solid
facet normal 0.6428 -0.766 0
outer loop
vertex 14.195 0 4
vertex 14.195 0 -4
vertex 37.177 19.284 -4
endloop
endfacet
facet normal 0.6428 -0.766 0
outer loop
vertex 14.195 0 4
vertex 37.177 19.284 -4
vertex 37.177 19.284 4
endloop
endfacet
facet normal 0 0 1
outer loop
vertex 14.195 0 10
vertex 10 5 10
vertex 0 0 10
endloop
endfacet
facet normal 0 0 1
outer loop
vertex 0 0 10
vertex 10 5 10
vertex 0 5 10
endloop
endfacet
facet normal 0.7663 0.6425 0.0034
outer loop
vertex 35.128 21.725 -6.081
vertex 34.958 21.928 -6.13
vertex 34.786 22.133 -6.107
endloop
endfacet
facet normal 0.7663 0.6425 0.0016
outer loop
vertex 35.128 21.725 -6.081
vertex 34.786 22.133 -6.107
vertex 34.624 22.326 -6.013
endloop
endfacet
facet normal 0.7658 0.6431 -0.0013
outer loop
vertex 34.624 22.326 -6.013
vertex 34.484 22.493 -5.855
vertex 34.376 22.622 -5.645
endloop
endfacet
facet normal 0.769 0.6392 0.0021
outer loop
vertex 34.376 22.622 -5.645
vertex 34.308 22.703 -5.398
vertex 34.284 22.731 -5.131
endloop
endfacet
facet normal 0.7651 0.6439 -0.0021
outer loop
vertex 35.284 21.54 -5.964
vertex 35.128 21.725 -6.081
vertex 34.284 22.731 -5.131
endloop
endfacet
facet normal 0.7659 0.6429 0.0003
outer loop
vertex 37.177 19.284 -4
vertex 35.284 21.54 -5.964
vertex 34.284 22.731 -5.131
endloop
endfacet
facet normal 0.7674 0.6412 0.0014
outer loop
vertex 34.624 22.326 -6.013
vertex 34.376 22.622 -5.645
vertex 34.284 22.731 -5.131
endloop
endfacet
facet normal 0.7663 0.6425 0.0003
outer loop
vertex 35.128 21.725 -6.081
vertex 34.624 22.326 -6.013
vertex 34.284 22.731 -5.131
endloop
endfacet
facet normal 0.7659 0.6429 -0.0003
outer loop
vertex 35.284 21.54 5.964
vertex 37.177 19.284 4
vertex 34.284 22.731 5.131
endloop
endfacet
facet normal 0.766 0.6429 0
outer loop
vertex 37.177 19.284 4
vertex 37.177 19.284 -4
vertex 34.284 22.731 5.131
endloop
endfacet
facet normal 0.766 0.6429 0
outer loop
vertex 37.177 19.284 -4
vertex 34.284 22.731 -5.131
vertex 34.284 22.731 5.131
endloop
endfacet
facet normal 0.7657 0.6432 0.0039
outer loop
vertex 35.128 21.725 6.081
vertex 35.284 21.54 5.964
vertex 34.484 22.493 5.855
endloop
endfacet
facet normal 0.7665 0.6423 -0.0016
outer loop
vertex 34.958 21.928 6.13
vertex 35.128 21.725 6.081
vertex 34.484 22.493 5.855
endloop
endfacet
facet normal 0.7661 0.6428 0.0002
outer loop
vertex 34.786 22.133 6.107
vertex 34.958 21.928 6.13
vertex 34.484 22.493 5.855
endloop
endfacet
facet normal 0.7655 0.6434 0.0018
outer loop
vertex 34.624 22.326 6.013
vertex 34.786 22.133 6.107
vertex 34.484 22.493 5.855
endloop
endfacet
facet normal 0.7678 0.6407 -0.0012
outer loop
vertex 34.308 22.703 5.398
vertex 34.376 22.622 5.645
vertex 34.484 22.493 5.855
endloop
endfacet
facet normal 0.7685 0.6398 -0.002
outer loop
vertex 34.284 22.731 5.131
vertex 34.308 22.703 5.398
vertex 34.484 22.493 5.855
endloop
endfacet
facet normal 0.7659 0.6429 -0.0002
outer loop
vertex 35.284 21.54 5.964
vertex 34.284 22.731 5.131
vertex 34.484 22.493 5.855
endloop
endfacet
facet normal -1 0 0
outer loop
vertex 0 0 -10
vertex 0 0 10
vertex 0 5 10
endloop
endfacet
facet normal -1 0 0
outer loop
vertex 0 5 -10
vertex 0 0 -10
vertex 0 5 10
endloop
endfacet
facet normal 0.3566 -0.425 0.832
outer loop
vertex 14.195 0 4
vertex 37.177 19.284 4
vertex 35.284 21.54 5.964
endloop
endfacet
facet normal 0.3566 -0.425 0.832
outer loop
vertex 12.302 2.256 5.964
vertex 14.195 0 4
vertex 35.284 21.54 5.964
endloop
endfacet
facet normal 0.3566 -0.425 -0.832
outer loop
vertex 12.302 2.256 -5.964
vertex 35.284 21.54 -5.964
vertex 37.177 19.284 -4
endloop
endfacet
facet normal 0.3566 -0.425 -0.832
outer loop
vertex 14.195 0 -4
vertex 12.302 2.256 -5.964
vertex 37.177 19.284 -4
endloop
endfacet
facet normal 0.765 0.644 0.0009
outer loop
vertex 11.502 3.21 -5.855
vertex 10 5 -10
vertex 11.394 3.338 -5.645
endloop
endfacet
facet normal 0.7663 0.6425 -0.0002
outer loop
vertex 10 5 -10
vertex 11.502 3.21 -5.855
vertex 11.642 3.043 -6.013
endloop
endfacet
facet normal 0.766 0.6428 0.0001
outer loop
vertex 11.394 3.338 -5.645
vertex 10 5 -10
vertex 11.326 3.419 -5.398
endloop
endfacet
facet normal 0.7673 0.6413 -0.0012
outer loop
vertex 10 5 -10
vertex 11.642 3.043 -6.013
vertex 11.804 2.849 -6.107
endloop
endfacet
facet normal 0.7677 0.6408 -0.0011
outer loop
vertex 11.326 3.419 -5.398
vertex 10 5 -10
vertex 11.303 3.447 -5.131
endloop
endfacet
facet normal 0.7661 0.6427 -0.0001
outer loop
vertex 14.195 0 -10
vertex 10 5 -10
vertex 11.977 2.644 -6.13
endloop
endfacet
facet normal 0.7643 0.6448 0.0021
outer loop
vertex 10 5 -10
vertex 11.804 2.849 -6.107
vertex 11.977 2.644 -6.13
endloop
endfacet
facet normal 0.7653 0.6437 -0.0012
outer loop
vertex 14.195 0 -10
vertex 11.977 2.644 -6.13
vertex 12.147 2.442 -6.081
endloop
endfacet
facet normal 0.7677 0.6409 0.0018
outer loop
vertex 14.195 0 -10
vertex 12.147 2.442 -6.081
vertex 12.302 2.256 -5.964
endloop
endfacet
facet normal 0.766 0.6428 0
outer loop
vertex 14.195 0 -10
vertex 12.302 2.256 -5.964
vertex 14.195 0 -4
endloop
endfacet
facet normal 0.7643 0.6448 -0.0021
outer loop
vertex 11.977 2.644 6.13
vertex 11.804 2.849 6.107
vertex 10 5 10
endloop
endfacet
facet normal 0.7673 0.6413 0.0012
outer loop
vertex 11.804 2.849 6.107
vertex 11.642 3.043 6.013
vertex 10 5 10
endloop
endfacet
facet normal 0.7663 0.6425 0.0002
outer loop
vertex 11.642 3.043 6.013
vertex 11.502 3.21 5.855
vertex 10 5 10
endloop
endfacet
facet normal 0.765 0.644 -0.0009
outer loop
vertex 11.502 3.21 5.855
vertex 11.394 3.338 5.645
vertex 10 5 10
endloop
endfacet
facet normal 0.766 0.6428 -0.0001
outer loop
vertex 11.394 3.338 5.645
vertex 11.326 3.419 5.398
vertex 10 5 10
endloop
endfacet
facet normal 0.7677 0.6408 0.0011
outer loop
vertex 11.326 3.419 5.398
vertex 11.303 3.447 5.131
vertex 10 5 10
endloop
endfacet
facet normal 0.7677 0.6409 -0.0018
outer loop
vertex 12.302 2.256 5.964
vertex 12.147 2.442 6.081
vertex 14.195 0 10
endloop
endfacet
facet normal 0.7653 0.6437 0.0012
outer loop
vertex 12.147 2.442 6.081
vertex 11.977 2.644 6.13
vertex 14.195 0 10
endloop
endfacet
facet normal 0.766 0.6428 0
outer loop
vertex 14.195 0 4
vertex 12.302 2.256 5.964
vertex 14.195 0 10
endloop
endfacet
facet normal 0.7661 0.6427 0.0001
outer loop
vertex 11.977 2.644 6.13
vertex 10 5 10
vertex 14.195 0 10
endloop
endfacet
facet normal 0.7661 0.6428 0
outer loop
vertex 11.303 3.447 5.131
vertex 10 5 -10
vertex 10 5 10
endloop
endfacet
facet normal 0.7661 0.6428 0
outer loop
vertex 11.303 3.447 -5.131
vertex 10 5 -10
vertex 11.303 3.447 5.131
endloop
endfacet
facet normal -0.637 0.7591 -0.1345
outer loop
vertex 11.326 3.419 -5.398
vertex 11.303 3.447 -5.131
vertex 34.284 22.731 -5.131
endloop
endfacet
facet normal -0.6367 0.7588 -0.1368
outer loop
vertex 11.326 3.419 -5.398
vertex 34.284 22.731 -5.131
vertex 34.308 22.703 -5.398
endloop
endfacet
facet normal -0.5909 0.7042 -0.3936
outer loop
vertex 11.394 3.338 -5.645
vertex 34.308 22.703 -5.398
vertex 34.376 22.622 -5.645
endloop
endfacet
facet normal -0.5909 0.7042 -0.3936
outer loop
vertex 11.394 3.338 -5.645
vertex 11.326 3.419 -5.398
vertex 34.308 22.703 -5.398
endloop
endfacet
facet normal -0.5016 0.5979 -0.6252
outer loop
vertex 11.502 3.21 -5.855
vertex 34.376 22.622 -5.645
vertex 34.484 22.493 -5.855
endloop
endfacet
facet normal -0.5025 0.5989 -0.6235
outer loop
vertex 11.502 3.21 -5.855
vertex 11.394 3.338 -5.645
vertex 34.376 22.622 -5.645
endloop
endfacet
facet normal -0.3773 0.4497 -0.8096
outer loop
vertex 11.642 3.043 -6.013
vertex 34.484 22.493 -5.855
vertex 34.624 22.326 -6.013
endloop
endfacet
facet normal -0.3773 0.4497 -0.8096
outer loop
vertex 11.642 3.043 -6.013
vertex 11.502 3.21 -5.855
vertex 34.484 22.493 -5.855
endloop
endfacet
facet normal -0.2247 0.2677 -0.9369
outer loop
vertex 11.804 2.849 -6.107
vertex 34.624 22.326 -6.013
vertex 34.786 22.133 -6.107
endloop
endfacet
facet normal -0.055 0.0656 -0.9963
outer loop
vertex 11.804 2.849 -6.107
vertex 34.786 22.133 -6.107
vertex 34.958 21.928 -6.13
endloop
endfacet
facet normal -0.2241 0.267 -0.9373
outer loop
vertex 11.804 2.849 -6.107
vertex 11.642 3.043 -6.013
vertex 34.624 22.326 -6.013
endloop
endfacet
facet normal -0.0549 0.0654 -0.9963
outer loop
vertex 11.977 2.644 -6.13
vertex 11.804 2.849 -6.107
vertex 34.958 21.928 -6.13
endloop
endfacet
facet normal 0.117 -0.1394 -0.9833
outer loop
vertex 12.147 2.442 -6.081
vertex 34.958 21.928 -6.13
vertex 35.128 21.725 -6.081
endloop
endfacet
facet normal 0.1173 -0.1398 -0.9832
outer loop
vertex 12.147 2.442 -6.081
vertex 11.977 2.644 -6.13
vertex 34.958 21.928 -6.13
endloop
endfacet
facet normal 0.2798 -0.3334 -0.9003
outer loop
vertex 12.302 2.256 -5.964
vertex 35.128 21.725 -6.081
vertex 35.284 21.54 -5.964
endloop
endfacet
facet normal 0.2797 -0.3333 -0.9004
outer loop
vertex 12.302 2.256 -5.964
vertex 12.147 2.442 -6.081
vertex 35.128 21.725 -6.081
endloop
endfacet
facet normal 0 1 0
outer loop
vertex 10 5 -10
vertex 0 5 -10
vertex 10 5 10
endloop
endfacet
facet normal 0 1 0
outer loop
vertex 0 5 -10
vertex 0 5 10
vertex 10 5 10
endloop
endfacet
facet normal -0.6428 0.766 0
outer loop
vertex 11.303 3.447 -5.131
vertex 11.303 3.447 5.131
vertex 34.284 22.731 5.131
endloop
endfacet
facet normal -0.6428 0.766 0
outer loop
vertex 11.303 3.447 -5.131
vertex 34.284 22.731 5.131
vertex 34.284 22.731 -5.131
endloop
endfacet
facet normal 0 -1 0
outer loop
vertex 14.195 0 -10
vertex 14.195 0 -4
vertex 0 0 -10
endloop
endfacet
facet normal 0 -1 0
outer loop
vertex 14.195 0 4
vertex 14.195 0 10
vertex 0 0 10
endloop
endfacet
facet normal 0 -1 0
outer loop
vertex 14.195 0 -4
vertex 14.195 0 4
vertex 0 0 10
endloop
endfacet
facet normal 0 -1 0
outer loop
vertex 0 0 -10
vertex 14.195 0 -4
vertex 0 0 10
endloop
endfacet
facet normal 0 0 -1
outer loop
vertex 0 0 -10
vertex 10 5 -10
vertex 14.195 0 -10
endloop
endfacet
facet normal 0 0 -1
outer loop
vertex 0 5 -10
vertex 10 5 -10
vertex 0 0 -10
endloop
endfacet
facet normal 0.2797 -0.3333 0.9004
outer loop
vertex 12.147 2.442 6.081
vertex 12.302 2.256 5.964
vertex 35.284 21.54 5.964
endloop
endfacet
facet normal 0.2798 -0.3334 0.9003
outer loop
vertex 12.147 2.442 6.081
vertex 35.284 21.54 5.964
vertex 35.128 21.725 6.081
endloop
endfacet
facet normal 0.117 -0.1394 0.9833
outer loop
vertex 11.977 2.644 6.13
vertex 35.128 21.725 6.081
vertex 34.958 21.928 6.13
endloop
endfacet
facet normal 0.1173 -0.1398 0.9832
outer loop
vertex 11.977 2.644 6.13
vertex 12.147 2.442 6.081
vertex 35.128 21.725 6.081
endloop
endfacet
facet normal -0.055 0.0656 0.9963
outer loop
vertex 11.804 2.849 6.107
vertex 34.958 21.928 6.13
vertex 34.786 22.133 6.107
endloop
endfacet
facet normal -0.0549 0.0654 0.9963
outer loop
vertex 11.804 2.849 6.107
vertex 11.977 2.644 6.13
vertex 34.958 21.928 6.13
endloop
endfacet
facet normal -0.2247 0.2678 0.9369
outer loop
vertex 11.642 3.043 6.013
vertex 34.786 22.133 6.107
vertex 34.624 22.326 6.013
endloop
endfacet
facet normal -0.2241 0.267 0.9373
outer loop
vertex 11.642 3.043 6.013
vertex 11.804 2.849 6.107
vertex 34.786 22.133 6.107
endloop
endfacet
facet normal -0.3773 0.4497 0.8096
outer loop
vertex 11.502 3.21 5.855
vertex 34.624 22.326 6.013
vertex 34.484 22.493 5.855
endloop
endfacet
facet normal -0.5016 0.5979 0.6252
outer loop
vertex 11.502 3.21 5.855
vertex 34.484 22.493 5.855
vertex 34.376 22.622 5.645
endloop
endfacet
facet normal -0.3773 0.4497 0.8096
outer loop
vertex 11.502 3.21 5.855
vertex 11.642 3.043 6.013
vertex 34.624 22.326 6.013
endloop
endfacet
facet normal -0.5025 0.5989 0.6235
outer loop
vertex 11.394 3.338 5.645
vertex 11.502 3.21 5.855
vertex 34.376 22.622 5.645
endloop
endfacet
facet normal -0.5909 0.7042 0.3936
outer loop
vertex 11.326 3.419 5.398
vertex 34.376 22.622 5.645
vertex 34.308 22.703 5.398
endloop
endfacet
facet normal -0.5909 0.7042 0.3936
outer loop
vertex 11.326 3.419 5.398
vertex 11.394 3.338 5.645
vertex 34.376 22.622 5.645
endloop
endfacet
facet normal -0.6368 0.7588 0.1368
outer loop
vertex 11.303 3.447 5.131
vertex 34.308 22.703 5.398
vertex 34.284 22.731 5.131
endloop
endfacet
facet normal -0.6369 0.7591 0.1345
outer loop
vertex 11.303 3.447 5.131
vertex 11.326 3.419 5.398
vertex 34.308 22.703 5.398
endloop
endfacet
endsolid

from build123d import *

# Parameters (mm, degrees)
BOSS_EXTRUDE2_DEPTH = 10
BOSS_EXTRUDE4_DEPTH = 30


with BuildPart() as part:
    # Sketch3 → Boss-Extrude2 (new, symmetric)
    with BuildSketch(Plane.XY):
        Polygon((0, 0), (0, 5), (10, 5), (14.195498156, 0), align=None)
    extrude(amount=BOSS_EXTRUDE2_DEPTH, both=True)

    # Sketch5 → Boss-Extrude4 (add)
    with BuildSketch(Plane(origin=(8.330260271, 6.989918321, 0), x_dir=(0, 0, -1), z_dir=(0.7660444431189745, 0.6427876096865437, 0))):
        with BuildLine():
            Line((-4, -9.124690328), (-5.963533203, -6.179390524))
            ThreePointArc((-5.963533203, -6.179390524), (-6.013157507, -5.152832402), (-5.131482908, -4.624690328))
            Line((-5.131482908, -4.624690328), (5.131482908, -4.624690328))
            ThreePointArc((5.131482908, -4.624690328), (6.013157507, -5.152832402), (5.963533203, -6.179390524))
            Line((5.963533203, -6.179390524), (4, -9.124690328))
            Line((4, -9.124690328), (-4, -9.124690328))
        make_face()
    extrude(amount=BOSS_EXTRUDE4_DEPTH)


solid = part.part
